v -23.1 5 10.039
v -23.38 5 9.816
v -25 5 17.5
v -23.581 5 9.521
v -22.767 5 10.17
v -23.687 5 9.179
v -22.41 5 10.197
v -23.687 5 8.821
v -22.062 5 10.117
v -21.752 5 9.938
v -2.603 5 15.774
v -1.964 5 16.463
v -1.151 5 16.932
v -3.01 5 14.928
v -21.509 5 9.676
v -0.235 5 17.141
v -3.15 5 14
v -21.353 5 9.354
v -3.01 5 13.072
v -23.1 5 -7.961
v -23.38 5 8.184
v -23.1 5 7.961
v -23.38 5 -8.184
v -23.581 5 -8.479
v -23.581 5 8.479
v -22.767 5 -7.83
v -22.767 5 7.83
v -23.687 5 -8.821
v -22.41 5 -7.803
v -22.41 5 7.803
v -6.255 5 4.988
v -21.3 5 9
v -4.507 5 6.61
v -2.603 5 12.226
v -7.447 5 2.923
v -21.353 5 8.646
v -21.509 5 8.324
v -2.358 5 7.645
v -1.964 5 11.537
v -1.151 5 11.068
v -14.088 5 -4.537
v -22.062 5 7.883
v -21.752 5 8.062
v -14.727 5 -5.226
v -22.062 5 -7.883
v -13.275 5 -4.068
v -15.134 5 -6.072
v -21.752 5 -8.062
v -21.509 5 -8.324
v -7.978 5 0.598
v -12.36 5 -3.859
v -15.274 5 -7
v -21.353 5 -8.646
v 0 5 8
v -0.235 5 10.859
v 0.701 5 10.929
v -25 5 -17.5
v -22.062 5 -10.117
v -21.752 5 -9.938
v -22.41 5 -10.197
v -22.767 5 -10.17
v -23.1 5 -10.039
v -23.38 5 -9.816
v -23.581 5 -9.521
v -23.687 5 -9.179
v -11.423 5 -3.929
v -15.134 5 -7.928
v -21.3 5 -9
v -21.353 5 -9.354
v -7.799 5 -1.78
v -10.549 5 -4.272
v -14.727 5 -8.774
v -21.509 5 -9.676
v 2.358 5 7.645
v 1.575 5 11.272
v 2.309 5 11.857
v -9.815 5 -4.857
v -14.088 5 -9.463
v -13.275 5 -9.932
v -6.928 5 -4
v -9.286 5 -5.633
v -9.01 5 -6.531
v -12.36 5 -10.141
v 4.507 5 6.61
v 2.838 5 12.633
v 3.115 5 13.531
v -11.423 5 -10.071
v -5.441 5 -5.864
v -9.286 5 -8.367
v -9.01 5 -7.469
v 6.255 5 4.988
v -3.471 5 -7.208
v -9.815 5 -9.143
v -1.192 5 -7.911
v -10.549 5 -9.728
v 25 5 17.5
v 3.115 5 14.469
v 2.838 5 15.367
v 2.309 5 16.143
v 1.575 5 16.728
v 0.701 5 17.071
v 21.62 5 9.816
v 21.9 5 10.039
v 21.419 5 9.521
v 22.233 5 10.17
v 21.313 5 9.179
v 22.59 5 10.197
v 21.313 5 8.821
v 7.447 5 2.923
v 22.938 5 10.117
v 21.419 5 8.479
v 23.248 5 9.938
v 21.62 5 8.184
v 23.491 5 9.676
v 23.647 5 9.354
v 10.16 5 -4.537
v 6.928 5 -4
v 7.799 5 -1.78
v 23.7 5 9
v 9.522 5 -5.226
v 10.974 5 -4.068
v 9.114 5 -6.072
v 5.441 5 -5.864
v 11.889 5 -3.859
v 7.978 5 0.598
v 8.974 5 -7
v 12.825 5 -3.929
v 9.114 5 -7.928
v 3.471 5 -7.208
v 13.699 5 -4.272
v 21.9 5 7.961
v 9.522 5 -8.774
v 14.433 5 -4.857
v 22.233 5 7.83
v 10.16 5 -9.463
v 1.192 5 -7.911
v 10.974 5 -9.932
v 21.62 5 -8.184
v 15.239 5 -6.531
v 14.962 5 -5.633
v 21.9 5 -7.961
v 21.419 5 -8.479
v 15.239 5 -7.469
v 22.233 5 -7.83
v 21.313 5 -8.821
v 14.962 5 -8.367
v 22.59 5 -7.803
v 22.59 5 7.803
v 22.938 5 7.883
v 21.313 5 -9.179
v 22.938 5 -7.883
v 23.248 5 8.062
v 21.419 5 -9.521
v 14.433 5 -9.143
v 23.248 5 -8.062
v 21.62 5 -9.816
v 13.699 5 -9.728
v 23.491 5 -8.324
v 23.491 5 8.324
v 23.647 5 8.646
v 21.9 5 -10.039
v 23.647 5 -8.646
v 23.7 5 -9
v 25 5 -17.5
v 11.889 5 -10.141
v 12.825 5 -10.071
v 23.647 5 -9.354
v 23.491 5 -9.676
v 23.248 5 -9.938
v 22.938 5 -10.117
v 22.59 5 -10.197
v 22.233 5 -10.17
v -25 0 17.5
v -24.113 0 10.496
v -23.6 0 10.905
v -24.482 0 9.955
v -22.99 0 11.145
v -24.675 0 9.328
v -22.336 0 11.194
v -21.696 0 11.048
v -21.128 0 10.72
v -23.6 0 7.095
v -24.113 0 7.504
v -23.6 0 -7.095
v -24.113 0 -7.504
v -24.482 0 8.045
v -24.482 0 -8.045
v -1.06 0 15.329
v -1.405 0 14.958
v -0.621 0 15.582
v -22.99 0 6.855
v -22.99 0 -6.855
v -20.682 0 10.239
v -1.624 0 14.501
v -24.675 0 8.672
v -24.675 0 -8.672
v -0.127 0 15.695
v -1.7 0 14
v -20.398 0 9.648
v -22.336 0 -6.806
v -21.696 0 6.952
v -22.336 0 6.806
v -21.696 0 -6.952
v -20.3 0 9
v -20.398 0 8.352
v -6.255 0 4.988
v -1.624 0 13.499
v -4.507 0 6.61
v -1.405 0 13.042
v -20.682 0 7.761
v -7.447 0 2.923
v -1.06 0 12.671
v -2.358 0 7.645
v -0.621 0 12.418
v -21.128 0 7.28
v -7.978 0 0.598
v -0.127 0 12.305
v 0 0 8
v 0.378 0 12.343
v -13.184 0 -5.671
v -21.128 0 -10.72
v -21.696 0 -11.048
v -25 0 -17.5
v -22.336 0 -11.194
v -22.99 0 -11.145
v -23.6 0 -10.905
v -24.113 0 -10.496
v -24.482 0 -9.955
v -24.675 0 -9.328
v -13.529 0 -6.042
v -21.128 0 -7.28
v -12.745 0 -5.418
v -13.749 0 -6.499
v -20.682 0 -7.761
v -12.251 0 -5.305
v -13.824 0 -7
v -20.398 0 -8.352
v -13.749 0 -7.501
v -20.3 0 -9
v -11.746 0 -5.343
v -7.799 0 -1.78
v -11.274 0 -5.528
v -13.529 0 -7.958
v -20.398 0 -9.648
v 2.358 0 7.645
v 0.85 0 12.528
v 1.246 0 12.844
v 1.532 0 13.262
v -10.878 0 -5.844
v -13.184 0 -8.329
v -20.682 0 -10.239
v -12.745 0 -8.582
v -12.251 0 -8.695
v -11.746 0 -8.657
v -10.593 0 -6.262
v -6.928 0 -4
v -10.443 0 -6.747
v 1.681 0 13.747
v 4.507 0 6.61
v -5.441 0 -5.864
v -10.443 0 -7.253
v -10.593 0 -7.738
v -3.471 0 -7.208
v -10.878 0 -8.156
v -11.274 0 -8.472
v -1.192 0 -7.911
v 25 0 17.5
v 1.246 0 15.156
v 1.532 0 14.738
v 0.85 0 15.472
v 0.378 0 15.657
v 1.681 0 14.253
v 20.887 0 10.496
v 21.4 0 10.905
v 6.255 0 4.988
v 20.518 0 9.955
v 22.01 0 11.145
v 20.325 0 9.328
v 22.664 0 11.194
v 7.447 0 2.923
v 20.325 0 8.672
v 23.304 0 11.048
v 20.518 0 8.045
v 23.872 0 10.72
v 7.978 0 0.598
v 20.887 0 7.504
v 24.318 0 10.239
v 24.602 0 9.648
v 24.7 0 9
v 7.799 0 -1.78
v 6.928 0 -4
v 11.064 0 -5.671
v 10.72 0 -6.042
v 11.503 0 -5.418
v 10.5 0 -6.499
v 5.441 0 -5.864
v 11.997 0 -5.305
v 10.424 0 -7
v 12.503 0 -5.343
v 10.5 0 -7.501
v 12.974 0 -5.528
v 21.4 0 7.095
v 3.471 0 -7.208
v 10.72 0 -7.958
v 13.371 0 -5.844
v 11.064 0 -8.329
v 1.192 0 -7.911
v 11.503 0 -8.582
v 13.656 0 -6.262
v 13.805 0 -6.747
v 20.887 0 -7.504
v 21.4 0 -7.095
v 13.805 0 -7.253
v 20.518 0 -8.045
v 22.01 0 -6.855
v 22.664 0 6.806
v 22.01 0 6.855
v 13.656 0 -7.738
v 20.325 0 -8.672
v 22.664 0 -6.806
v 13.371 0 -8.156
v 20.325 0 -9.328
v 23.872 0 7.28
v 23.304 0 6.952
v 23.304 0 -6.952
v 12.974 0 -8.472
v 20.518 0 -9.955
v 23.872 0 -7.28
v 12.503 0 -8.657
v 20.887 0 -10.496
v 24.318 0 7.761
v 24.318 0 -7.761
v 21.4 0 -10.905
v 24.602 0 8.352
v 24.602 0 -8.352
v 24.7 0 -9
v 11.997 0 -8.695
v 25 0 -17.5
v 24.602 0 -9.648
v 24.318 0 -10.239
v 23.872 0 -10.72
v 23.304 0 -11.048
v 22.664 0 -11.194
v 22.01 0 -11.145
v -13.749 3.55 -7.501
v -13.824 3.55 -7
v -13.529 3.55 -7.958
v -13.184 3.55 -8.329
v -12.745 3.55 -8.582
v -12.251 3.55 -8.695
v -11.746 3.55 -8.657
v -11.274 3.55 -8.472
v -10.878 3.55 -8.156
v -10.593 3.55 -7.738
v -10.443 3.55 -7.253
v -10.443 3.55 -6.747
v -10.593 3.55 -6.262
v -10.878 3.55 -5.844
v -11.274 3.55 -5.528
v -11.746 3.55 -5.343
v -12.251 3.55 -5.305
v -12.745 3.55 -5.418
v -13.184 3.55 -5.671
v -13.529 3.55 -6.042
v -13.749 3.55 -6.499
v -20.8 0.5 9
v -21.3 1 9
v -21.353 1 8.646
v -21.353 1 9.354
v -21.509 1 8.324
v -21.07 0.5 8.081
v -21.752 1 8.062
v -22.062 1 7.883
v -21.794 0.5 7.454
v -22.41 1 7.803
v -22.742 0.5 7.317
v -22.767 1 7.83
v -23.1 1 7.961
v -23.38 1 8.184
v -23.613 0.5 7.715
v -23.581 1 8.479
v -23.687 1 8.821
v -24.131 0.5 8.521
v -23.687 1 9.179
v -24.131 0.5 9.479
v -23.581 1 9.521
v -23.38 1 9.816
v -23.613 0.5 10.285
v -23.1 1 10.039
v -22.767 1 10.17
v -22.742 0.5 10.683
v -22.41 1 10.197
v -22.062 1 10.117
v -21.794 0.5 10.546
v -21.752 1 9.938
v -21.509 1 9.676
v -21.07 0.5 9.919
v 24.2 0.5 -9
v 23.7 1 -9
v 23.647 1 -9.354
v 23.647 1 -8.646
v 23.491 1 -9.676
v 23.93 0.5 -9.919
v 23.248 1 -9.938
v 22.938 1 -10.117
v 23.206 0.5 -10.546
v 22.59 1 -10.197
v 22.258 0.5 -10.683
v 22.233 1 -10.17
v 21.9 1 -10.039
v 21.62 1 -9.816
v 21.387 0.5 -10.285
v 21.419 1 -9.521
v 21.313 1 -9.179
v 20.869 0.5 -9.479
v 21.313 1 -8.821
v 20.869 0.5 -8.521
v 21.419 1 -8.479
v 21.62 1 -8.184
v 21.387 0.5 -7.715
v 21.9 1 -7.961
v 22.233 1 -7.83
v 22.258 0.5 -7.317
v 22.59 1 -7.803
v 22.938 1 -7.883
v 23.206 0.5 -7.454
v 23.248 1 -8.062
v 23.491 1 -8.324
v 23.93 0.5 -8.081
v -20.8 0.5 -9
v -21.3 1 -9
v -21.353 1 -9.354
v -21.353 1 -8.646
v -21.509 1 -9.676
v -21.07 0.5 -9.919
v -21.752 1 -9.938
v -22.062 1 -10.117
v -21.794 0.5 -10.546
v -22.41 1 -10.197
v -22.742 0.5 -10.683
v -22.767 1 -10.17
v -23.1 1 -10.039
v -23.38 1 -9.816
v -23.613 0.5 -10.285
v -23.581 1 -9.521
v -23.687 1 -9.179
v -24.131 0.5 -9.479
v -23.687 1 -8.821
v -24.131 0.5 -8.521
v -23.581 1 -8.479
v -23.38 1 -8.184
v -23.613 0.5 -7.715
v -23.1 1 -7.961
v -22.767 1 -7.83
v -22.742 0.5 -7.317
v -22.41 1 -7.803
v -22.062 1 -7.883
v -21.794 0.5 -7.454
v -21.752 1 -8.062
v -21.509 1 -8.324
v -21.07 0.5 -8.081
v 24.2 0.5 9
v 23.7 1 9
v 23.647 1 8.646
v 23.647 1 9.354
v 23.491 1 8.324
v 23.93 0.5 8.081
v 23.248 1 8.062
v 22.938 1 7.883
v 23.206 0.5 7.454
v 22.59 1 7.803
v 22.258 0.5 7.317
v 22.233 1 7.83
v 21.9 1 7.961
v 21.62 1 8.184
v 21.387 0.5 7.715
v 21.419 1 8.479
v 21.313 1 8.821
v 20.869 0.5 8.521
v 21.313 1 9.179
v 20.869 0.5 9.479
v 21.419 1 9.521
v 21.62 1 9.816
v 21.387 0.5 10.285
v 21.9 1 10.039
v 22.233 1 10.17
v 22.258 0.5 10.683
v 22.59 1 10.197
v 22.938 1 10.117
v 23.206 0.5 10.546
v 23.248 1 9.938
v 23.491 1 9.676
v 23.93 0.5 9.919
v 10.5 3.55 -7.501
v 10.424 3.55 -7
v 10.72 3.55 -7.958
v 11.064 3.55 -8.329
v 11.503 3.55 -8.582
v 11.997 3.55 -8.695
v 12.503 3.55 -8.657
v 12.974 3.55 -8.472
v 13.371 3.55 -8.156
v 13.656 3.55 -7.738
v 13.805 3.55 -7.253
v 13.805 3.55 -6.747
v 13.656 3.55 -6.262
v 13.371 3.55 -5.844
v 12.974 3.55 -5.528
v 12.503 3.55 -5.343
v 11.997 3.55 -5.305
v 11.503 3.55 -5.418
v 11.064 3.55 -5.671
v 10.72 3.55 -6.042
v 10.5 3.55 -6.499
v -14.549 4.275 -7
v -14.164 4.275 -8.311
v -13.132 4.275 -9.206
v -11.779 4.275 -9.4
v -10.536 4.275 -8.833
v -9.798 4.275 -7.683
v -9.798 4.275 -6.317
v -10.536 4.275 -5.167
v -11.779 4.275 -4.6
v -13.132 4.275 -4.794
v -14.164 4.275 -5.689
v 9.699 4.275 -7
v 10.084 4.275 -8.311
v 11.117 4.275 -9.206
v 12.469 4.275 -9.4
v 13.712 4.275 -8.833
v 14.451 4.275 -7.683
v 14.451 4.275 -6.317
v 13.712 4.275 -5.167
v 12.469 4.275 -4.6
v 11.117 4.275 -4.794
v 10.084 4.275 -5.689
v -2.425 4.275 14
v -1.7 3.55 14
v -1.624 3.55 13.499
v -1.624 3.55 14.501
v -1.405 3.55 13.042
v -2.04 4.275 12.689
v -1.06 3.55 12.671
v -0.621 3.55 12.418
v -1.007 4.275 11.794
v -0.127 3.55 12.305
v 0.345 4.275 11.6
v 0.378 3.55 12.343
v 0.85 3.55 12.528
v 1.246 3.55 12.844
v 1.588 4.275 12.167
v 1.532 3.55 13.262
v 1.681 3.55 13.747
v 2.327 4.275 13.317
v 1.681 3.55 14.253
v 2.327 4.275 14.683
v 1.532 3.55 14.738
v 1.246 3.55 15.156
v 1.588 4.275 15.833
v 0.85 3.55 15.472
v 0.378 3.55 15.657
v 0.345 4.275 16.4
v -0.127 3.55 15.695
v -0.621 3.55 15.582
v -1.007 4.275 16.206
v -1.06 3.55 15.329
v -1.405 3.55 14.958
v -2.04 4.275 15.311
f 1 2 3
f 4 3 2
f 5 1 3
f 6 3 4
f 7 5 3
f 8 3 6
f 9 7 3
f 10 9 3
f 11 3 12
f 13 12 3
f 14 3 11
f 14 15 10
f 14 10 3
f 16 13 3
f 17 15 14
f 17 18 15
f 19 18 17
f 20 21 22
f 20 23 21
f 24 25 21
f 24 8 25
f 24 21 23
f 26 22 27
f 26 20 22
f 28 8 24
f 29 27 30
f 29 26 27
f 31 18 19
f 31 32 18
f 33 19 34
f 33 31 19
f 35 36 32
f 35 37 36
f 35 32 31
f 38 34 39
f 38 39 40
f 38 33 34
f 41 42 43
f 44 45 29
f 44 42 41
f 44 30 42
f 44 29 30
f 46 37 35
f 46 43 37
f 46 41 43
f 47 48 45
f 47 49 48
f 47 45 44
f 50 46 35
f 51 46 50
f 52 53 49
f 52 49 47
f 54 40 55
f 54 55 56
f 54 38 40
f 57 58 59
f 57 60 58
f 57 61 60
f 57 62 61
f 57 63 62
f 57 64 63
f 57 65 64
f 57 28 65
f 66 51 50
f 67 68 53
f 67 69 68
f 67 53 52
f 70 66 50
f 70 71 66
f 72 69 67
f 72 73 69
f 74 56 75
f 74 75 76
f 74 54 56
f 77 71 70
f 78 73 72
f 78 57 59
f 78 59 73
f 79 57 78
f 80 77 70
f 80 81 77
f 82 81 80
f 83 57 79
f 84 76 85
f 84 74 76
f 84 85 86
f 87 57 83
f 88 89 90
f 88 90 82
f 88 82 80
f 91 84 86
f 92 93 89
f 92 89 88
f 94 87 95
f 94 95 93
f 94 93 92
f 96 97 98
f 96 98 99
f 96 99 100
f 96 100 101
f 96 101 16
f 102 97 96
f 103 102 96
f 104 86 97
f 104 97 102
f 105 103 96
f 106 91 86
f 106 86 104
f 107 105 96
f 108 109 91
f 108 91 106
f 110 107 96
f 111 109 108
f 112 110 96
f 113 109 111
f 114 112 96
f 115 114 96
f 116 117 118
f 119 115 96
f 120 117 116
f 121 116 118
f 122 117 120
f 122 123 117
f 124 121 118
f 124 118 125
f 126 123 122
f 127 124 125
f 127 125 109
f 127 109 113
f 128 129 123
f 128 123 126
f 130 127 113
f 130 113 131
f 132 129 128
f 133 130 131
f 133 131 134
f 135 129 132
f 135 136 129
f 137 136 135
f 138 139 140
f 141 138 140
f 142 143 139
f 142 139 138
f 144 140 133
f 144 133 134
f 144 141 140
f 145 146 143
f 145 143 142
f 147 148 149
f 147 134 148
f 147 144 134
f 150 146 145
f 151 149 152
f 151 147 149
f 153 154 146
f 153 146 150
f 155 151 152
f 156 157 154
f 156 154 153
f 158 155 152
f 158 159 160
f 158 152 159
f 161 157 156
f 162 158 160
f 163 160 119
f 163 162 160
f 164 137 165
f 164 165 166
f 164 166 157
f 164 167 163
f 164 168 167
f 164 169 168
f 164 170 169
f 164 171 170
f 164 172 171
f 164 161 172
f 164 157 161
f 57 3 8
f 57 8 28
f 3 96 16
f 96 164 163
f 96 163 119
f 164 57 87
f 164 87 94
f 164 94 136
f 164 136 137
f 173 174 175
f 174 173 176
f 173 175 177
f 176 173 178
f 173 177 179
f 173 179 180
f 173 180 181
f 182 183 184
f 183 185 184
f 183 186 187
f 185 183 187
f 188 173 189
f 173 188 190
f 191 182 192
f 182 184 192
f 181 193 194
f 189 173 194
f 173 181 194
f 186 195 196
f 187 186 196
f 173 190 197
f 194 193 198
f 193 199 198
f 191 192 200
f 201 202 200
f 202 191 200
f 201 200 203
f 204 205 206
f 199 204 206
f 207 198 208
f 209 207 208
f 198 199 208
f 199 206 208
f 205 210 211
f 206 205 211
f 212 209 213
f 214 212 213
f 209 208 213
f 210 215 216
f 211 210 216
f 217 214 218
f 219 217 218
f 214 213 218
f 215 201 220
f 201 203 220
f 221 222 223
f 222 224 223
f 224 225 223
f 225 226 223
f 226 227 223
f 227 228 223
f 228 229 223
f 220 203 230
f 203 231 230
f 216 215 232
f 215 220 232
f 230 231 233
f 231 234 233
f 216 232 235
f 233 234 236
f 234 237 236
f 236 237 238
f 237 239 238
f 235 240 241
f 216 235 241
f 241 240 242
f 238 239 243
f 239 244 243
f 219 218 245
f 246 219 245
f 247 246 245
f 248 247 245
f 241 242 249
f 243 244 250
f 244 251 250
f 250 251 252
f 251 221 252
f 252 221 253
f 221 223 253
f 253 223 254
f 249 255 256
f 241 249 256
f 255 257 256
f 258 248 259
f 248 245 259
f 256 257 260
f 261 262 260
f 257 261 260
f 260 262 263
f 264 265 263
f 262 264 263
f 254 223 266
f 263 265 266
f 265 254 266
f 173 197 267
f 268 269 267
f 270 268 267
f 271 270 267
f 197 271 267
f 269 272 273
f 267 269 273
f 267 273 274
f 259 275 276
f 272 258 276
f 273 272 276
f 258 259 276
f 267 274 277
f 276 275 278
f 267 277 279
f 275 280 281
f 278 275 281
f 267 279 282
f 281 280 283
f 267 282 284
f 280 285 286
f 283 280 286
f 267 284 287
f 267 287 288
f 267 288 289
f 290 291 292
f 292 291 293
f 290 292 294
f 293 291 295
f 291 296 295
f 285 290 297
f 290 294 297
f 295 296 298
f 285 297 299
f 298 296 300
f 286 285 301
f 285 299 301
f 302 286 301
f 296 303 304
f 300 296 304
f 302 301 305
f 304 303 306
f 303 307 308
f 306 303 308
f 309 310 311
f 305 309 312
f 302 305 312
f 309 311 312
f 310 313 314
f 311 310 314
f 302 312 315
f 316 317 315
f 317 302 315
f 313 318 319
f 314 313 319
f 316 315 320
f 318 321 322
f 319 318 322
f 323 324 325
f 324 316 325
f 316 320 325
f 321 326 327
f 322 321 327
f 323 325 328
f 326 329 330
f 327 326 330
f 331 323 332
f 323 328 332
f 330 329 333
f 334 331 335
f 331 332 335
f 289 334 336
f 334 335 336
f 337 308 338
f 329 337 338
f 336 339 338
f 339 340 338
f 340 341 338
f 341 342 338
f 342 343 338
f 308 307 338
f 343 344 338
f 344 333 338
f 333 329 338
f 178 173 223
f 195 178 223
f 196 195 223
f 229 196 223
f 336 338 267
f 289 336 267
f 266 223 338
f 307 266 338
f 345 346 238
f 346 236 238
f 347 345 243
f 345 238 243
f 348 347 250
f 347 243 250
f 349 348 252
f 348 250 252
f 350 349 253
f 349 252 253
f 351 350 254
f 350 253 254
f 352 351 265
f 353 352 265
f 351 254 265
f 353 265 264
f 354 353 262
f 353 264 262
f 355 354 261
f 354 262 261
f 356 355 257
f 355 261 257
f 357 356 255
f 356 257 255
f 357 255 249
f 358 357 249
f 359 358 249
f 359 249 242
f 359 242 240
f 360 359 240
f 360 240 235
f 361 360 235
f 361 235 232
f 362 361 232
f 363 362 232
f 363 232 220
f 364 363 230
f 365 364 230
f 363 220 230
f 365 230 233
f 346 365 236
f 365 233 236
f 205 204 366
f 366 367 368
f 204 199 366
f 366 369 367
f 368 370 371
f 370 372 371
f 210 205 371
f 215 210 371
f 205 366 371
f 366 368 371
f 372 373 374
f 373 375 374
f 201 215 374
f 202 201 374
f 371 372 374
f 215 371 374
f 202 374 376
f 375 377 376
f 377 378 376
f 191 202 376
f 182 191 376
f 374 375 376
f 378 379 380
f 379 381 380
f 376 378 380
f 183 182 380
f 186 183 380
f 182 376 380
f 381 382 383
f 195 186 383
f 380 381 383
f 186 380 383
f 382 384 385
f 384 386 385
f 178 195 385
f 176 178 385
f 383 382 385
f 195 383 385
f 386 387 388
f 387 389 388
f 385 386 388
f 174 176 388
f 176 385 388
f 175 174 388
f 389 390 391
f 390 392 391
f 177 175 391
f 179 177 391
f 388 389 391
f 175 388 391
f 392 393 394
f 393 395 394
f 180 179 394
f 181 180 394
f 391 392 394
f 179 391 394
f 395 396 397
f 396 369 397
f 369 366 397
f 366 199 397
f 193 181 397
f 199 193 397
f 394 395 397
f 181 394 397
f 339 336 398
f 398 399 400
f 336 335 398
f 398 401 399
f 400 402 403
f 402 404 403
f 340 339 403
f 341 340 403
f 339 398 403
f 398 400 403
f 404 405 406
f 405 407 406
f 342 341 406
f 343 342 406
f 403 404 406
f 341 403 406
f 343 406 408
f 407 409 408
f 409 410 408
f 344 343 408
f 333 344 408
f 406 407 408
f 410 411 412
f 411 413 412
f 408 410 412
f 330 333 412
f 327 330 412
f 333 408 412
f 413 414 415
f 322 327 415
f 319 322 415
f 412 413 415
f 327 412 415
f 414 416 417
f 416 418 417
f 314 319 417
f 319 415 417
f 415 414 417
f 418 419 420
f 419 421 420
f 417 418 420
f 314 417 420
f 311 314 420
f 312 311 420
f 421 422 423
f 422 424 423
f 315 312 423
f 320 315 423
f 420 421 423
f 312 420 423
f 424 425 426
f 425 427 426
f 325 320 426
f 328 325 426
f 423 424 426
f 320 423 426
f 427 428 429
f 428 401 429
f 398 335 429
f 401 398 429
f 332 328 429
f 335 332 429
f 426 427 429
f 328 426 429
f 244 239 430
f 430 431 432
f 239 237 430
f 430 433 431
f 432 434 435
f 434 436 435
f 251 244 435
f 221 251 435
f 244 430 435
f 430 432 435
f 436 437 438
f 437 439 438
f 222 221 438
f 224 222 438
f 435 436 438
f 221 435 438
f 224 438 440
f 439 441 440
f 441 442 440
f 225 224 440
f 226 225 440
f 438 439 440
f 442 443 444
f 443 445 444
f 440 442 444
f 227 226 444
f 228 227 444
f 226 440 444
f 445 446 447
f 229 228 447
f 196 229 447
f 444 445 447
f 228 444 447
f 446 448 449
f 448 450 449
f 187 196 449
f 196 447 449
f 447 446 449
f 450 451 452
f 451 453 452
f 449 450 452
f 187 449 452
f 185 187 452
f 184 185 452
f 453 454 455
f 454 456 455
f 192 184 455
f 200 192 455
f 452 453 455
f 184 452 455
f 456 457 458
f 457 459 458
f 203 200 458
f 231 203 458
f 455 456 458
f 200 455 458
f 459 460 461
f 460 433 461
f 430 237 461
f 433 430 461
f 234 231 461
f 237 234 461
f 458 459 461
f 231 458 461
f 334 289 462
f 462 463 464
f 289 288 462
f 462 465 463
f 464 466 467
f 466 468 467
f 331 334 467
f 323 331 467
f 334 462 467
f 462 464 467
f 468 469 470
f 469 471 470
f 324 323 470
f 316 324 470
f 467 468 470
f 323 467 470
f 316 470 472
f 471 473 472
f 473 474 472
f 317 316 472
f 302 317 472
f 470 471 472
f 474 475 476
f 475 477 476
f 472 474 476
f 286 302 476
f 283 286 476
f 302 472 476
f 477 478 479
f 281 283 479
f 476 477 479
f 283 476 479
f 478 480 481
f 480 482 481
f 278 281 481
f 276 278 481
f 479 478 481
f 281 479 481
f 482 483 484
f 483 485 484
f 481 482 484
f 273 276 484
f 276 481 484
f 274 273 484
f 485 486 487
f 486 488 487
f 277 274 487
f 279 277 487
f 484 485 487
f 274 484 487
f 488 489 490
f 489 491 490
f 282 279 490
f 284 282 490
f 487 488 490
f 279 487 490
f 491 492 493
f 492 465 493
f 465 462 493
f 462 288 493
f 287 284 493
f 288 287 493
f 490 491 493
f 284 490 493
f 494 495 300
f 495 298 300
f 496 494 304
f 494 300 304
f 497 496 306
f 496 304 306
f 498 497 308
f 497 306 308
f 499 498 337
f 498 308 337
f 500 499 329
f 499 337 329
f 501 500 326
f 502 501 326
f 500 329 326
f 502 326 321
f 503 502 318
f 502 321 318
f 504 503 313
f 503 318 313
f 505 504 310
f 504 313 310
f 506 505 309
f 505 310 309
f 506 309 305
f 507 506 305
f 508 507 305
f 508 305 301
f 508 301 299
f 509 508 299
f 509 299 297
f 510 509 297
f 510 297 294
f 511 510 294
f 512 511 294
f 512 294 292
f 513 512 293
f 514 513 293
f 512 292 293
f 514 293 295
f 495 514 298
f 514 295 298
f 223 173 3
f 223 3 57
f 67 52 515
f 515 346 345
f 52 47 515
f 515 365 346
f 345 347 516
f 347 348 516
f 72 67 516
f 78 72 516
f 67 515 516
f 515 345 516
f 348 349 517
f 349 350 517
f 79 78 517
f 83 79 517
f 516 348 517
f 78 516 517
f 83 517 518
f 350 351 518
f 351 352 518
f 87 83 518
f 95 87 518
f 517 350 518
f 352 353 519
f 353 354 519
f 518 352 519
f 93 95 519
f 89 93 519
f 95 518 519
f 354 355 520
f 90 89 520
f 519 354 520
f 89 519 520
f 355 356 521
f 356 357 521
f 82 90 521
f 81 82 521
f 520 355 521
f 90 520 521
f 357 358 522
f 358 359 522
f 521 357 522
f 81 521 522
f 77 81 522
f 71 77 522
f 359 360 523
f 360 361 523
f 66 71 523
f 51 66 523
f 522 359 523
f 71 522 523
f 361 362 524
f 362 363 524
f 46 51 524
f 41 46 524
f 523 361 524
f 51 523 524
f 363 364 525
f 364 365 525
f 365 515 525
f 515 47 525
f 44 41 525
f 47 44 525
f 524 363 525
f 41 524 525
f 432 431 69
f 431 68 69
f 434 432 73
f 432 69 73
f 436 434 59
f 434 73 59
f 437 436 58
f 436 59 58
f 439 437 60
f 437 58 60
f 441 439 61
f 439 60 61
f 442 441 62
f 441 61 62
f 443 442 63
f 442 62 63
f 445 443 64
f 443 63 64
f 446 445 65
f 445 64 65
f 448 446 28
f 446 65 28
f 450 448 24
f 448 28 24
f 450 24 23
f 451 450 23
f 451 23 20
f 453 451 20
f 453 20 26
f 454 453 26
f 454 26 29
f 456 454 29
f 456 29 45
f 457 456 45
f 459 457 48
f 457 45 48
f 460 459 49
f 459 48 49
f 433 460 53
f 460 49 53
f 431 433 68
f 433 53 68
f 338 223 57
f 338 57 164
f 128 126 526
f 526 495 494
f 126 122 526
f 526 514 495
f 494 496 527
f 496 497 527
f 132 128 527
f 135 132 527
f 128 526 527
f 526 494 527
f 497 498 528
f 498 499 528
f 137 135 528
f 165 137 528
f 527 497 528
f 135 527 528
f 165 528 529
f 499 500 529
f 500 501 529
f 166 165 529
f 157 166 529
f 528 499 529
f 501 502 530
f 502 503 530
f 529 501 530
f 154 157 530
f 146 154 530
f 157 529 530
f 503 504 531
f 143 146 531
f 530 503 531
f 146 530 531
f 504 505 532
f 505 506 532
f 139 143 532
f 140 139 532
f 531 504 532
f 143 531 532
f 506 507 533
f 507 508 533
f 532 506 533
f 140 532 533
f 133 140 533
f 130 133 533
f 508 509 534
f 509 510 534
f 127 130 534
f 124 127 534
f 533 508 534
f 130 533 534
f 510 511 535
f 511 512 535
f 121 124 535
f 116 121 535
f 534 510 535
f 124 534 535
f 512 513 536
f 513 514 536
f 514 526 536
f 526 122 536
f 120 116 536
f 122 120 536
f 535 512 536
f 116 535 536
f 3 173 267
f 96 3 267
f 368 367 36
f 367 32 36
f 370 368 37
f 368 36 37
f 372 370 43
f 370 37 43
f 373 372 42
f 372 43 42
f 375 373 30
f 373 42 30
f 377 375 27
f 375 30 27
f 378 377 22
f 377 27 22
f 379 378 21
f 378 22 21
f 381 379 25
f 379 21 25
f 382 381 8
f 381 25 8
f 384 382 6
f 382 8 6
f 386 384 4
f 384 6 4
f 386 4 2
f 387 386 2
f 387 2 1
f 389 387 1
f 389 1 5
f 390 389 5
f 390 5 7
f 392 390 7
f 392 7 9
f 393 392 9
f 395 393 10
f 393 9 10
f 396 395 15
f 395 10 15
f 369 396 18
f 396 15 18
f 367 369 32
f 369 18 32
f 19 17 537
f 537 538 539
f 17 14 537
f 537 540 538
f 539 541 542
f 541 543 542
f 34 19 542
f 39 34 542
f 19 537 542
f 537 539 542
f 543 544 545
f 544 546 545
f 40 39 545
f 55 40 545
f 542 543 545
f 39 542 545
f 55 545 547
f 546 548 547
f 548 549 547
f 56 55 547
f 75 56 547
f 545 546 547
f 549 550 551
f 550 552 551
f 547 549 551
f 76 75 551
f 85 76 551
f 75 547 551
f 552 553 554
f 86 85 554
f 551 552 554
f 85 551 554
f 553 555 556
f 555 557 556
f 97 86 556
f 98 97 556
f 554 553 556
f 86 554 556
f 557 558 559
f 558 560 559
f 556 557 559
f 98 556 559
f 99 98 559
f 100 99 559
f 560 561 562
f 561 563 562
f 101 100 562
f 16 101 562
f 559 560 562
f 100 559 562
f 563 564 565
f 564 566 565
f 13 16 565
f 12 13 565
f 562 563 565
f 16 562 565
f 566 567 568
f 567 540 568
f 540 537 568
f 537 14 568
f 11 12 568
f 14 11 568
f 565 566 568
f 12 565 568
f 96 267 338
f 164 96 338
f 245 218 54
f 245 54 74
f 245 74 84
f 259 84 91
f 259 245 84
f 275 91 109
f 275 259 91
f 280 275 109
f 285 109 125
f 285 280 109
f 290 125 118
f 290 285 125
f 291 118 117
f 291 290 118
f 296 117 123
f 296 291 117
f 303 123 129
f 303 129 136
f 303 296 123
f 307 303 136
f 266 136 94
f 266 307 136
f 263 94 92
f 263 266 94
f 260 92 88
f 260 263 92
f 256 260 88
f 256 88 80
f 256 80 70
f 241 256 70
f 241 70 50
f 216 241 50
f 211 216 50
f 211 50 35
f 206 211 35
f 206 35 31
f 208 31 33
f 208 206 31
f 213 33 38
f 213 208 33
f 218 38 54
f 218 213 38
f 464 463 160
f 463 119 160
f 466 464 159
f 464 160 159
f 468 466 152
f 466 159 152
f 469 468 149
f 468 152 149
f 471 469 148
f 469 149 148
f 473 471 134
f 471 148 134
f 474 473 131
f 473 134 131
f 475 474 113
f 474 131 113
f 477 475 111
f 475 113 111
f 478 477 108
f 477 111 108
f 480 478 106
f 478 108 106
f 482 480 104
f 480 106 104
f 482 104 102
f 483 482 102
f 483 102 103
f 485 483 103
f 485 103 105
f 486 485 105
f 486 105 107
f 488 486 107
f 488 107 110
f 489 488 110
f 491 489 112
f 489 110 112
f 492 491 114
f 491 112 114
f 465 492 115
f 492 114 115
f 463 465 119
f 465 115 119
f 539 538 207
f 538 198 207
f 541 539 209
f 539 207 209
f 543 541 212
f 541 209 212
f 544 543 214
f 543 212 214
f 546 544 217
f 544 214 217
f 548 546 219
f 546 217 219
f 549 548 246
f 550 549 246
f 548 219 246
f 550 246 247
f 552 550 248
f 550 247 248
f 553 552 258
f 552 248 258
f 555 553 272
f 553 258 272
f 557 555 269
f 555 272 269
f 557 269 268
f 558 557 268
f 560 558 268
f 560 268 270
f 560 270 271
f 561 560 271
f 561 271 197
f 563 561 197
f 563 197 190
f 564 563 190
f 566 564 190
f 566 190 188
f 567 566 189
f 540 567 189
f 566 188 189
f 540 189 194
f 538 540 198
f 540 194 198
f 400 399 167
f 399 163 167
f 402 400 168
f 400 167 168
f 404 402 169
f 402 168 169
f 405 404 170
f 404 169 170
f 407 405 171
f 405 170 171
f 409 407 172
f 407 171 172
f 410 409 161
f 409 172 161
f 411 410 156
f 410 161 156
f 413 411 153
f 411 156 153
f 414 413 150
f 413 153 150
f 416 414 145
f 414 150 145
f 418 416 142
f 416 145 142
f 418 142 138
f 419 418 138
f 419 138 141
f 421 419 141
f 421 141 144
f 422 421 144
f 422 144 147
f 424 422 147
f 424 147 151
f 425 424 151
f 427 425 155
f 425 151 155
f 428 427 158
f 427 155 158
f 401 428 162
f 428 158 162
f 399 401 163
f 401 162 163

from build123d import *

# Parameters (mm, degrees)
SKETCH1_W                                           = 50
SKETCH1_H                                           = 35
SKETCH1_R                                           = 8
BOSS_EXTRUDE1_DEPTH                                 = 5
CSK_FOR_M3_COUNTERSUNK_FLAT_HEAD_SCREW1_D           = 3.4
CSK_FOR_M3_COUNTERSUNK_FLAT_HEAD_SCREW1_CSINK_D     = 6.3
CSK_FOR_M3_COUNTERSUNK_FLAT_HEAD_SCREW1_CSINK_ANGLE = 90
CSK_FOR_M2_COUNTERSUNK_FLAT_HEAD_SCREW1_D           = 2.4
CSK_FOR_M2_COUNTERSUNK_FLAT_HEAD_SCREW1_CSINK_D     = 4.4
CSK_FOR_M2_COUNTERSUNK_FLAT_HEAD_SCREW1_CSINK_ANGLE = 90


with BuildPart() as part:
    # Sketch1 → Boss-Extrude1 (new body)
    with BuildSketch(Plane(origin=(0, 0, 0), x_dir=(1, 0, 0), z_dir=(0, 1, 0))):
        Rectangle(SKETCH1_W, SKETCH1_H)
        with Locations(Location((0, 0, 0), (0, 0, 270))):
            Circle(SKETCH1_R, mode=Mode.SUBTRACT)
    extrude(amount=BOSS_EXTRUDE1_DEPTH)

    # CSK for M3 Countersunk Flat Head Screw1 (through all)
    with Locations(Plane(origin=(0, 5, 0), x_dir=(1, 0, 0), z_dir=(0, 1, 0))):
        with Locations((12.124355653, 7), (0, -14), (-12.124355653, 7)):
            CounterSinkHole(CSK_FOR_M3_COUNTERSUNK_FLAT_HEAD_SCREW1_D / 2, CSK_FOR_M3_COUNTERSUNK_FLAT_HEAD_SCREW1_CSINK_D / 2, counter_sink_angle=CSK_FOR_M3_COUNTERSUNK_FLAT_HEAD_SCREW1_CSINK_ANGLE)

    # CSK for M2 Countersunk Flat Head Screw1 (through all)
    with Locations(Plane(origin=(0, 0, 0), x_dir=(-1, 0, 0), z_dir=(0, -1, 0))):
        with Locations((22.5, -9), (22.5, 9), (-22.5, 9), (-22.5, -9)):
            CounterSinkHole(CSK_FOR_M2_COUNTERSUNK_FLAT_HEAD_SCREW1_D / 2, CSK_FOR_M2_COUNTERSUNK_FLAT_HEAD_SCREW1_CSINK_D / 2, counter_sink_angle=CSK_FOR_M2_COUNTERSUNK_FLAT_HEAD_SCREW1_CSINK_ANGLE)


solid = part.part
